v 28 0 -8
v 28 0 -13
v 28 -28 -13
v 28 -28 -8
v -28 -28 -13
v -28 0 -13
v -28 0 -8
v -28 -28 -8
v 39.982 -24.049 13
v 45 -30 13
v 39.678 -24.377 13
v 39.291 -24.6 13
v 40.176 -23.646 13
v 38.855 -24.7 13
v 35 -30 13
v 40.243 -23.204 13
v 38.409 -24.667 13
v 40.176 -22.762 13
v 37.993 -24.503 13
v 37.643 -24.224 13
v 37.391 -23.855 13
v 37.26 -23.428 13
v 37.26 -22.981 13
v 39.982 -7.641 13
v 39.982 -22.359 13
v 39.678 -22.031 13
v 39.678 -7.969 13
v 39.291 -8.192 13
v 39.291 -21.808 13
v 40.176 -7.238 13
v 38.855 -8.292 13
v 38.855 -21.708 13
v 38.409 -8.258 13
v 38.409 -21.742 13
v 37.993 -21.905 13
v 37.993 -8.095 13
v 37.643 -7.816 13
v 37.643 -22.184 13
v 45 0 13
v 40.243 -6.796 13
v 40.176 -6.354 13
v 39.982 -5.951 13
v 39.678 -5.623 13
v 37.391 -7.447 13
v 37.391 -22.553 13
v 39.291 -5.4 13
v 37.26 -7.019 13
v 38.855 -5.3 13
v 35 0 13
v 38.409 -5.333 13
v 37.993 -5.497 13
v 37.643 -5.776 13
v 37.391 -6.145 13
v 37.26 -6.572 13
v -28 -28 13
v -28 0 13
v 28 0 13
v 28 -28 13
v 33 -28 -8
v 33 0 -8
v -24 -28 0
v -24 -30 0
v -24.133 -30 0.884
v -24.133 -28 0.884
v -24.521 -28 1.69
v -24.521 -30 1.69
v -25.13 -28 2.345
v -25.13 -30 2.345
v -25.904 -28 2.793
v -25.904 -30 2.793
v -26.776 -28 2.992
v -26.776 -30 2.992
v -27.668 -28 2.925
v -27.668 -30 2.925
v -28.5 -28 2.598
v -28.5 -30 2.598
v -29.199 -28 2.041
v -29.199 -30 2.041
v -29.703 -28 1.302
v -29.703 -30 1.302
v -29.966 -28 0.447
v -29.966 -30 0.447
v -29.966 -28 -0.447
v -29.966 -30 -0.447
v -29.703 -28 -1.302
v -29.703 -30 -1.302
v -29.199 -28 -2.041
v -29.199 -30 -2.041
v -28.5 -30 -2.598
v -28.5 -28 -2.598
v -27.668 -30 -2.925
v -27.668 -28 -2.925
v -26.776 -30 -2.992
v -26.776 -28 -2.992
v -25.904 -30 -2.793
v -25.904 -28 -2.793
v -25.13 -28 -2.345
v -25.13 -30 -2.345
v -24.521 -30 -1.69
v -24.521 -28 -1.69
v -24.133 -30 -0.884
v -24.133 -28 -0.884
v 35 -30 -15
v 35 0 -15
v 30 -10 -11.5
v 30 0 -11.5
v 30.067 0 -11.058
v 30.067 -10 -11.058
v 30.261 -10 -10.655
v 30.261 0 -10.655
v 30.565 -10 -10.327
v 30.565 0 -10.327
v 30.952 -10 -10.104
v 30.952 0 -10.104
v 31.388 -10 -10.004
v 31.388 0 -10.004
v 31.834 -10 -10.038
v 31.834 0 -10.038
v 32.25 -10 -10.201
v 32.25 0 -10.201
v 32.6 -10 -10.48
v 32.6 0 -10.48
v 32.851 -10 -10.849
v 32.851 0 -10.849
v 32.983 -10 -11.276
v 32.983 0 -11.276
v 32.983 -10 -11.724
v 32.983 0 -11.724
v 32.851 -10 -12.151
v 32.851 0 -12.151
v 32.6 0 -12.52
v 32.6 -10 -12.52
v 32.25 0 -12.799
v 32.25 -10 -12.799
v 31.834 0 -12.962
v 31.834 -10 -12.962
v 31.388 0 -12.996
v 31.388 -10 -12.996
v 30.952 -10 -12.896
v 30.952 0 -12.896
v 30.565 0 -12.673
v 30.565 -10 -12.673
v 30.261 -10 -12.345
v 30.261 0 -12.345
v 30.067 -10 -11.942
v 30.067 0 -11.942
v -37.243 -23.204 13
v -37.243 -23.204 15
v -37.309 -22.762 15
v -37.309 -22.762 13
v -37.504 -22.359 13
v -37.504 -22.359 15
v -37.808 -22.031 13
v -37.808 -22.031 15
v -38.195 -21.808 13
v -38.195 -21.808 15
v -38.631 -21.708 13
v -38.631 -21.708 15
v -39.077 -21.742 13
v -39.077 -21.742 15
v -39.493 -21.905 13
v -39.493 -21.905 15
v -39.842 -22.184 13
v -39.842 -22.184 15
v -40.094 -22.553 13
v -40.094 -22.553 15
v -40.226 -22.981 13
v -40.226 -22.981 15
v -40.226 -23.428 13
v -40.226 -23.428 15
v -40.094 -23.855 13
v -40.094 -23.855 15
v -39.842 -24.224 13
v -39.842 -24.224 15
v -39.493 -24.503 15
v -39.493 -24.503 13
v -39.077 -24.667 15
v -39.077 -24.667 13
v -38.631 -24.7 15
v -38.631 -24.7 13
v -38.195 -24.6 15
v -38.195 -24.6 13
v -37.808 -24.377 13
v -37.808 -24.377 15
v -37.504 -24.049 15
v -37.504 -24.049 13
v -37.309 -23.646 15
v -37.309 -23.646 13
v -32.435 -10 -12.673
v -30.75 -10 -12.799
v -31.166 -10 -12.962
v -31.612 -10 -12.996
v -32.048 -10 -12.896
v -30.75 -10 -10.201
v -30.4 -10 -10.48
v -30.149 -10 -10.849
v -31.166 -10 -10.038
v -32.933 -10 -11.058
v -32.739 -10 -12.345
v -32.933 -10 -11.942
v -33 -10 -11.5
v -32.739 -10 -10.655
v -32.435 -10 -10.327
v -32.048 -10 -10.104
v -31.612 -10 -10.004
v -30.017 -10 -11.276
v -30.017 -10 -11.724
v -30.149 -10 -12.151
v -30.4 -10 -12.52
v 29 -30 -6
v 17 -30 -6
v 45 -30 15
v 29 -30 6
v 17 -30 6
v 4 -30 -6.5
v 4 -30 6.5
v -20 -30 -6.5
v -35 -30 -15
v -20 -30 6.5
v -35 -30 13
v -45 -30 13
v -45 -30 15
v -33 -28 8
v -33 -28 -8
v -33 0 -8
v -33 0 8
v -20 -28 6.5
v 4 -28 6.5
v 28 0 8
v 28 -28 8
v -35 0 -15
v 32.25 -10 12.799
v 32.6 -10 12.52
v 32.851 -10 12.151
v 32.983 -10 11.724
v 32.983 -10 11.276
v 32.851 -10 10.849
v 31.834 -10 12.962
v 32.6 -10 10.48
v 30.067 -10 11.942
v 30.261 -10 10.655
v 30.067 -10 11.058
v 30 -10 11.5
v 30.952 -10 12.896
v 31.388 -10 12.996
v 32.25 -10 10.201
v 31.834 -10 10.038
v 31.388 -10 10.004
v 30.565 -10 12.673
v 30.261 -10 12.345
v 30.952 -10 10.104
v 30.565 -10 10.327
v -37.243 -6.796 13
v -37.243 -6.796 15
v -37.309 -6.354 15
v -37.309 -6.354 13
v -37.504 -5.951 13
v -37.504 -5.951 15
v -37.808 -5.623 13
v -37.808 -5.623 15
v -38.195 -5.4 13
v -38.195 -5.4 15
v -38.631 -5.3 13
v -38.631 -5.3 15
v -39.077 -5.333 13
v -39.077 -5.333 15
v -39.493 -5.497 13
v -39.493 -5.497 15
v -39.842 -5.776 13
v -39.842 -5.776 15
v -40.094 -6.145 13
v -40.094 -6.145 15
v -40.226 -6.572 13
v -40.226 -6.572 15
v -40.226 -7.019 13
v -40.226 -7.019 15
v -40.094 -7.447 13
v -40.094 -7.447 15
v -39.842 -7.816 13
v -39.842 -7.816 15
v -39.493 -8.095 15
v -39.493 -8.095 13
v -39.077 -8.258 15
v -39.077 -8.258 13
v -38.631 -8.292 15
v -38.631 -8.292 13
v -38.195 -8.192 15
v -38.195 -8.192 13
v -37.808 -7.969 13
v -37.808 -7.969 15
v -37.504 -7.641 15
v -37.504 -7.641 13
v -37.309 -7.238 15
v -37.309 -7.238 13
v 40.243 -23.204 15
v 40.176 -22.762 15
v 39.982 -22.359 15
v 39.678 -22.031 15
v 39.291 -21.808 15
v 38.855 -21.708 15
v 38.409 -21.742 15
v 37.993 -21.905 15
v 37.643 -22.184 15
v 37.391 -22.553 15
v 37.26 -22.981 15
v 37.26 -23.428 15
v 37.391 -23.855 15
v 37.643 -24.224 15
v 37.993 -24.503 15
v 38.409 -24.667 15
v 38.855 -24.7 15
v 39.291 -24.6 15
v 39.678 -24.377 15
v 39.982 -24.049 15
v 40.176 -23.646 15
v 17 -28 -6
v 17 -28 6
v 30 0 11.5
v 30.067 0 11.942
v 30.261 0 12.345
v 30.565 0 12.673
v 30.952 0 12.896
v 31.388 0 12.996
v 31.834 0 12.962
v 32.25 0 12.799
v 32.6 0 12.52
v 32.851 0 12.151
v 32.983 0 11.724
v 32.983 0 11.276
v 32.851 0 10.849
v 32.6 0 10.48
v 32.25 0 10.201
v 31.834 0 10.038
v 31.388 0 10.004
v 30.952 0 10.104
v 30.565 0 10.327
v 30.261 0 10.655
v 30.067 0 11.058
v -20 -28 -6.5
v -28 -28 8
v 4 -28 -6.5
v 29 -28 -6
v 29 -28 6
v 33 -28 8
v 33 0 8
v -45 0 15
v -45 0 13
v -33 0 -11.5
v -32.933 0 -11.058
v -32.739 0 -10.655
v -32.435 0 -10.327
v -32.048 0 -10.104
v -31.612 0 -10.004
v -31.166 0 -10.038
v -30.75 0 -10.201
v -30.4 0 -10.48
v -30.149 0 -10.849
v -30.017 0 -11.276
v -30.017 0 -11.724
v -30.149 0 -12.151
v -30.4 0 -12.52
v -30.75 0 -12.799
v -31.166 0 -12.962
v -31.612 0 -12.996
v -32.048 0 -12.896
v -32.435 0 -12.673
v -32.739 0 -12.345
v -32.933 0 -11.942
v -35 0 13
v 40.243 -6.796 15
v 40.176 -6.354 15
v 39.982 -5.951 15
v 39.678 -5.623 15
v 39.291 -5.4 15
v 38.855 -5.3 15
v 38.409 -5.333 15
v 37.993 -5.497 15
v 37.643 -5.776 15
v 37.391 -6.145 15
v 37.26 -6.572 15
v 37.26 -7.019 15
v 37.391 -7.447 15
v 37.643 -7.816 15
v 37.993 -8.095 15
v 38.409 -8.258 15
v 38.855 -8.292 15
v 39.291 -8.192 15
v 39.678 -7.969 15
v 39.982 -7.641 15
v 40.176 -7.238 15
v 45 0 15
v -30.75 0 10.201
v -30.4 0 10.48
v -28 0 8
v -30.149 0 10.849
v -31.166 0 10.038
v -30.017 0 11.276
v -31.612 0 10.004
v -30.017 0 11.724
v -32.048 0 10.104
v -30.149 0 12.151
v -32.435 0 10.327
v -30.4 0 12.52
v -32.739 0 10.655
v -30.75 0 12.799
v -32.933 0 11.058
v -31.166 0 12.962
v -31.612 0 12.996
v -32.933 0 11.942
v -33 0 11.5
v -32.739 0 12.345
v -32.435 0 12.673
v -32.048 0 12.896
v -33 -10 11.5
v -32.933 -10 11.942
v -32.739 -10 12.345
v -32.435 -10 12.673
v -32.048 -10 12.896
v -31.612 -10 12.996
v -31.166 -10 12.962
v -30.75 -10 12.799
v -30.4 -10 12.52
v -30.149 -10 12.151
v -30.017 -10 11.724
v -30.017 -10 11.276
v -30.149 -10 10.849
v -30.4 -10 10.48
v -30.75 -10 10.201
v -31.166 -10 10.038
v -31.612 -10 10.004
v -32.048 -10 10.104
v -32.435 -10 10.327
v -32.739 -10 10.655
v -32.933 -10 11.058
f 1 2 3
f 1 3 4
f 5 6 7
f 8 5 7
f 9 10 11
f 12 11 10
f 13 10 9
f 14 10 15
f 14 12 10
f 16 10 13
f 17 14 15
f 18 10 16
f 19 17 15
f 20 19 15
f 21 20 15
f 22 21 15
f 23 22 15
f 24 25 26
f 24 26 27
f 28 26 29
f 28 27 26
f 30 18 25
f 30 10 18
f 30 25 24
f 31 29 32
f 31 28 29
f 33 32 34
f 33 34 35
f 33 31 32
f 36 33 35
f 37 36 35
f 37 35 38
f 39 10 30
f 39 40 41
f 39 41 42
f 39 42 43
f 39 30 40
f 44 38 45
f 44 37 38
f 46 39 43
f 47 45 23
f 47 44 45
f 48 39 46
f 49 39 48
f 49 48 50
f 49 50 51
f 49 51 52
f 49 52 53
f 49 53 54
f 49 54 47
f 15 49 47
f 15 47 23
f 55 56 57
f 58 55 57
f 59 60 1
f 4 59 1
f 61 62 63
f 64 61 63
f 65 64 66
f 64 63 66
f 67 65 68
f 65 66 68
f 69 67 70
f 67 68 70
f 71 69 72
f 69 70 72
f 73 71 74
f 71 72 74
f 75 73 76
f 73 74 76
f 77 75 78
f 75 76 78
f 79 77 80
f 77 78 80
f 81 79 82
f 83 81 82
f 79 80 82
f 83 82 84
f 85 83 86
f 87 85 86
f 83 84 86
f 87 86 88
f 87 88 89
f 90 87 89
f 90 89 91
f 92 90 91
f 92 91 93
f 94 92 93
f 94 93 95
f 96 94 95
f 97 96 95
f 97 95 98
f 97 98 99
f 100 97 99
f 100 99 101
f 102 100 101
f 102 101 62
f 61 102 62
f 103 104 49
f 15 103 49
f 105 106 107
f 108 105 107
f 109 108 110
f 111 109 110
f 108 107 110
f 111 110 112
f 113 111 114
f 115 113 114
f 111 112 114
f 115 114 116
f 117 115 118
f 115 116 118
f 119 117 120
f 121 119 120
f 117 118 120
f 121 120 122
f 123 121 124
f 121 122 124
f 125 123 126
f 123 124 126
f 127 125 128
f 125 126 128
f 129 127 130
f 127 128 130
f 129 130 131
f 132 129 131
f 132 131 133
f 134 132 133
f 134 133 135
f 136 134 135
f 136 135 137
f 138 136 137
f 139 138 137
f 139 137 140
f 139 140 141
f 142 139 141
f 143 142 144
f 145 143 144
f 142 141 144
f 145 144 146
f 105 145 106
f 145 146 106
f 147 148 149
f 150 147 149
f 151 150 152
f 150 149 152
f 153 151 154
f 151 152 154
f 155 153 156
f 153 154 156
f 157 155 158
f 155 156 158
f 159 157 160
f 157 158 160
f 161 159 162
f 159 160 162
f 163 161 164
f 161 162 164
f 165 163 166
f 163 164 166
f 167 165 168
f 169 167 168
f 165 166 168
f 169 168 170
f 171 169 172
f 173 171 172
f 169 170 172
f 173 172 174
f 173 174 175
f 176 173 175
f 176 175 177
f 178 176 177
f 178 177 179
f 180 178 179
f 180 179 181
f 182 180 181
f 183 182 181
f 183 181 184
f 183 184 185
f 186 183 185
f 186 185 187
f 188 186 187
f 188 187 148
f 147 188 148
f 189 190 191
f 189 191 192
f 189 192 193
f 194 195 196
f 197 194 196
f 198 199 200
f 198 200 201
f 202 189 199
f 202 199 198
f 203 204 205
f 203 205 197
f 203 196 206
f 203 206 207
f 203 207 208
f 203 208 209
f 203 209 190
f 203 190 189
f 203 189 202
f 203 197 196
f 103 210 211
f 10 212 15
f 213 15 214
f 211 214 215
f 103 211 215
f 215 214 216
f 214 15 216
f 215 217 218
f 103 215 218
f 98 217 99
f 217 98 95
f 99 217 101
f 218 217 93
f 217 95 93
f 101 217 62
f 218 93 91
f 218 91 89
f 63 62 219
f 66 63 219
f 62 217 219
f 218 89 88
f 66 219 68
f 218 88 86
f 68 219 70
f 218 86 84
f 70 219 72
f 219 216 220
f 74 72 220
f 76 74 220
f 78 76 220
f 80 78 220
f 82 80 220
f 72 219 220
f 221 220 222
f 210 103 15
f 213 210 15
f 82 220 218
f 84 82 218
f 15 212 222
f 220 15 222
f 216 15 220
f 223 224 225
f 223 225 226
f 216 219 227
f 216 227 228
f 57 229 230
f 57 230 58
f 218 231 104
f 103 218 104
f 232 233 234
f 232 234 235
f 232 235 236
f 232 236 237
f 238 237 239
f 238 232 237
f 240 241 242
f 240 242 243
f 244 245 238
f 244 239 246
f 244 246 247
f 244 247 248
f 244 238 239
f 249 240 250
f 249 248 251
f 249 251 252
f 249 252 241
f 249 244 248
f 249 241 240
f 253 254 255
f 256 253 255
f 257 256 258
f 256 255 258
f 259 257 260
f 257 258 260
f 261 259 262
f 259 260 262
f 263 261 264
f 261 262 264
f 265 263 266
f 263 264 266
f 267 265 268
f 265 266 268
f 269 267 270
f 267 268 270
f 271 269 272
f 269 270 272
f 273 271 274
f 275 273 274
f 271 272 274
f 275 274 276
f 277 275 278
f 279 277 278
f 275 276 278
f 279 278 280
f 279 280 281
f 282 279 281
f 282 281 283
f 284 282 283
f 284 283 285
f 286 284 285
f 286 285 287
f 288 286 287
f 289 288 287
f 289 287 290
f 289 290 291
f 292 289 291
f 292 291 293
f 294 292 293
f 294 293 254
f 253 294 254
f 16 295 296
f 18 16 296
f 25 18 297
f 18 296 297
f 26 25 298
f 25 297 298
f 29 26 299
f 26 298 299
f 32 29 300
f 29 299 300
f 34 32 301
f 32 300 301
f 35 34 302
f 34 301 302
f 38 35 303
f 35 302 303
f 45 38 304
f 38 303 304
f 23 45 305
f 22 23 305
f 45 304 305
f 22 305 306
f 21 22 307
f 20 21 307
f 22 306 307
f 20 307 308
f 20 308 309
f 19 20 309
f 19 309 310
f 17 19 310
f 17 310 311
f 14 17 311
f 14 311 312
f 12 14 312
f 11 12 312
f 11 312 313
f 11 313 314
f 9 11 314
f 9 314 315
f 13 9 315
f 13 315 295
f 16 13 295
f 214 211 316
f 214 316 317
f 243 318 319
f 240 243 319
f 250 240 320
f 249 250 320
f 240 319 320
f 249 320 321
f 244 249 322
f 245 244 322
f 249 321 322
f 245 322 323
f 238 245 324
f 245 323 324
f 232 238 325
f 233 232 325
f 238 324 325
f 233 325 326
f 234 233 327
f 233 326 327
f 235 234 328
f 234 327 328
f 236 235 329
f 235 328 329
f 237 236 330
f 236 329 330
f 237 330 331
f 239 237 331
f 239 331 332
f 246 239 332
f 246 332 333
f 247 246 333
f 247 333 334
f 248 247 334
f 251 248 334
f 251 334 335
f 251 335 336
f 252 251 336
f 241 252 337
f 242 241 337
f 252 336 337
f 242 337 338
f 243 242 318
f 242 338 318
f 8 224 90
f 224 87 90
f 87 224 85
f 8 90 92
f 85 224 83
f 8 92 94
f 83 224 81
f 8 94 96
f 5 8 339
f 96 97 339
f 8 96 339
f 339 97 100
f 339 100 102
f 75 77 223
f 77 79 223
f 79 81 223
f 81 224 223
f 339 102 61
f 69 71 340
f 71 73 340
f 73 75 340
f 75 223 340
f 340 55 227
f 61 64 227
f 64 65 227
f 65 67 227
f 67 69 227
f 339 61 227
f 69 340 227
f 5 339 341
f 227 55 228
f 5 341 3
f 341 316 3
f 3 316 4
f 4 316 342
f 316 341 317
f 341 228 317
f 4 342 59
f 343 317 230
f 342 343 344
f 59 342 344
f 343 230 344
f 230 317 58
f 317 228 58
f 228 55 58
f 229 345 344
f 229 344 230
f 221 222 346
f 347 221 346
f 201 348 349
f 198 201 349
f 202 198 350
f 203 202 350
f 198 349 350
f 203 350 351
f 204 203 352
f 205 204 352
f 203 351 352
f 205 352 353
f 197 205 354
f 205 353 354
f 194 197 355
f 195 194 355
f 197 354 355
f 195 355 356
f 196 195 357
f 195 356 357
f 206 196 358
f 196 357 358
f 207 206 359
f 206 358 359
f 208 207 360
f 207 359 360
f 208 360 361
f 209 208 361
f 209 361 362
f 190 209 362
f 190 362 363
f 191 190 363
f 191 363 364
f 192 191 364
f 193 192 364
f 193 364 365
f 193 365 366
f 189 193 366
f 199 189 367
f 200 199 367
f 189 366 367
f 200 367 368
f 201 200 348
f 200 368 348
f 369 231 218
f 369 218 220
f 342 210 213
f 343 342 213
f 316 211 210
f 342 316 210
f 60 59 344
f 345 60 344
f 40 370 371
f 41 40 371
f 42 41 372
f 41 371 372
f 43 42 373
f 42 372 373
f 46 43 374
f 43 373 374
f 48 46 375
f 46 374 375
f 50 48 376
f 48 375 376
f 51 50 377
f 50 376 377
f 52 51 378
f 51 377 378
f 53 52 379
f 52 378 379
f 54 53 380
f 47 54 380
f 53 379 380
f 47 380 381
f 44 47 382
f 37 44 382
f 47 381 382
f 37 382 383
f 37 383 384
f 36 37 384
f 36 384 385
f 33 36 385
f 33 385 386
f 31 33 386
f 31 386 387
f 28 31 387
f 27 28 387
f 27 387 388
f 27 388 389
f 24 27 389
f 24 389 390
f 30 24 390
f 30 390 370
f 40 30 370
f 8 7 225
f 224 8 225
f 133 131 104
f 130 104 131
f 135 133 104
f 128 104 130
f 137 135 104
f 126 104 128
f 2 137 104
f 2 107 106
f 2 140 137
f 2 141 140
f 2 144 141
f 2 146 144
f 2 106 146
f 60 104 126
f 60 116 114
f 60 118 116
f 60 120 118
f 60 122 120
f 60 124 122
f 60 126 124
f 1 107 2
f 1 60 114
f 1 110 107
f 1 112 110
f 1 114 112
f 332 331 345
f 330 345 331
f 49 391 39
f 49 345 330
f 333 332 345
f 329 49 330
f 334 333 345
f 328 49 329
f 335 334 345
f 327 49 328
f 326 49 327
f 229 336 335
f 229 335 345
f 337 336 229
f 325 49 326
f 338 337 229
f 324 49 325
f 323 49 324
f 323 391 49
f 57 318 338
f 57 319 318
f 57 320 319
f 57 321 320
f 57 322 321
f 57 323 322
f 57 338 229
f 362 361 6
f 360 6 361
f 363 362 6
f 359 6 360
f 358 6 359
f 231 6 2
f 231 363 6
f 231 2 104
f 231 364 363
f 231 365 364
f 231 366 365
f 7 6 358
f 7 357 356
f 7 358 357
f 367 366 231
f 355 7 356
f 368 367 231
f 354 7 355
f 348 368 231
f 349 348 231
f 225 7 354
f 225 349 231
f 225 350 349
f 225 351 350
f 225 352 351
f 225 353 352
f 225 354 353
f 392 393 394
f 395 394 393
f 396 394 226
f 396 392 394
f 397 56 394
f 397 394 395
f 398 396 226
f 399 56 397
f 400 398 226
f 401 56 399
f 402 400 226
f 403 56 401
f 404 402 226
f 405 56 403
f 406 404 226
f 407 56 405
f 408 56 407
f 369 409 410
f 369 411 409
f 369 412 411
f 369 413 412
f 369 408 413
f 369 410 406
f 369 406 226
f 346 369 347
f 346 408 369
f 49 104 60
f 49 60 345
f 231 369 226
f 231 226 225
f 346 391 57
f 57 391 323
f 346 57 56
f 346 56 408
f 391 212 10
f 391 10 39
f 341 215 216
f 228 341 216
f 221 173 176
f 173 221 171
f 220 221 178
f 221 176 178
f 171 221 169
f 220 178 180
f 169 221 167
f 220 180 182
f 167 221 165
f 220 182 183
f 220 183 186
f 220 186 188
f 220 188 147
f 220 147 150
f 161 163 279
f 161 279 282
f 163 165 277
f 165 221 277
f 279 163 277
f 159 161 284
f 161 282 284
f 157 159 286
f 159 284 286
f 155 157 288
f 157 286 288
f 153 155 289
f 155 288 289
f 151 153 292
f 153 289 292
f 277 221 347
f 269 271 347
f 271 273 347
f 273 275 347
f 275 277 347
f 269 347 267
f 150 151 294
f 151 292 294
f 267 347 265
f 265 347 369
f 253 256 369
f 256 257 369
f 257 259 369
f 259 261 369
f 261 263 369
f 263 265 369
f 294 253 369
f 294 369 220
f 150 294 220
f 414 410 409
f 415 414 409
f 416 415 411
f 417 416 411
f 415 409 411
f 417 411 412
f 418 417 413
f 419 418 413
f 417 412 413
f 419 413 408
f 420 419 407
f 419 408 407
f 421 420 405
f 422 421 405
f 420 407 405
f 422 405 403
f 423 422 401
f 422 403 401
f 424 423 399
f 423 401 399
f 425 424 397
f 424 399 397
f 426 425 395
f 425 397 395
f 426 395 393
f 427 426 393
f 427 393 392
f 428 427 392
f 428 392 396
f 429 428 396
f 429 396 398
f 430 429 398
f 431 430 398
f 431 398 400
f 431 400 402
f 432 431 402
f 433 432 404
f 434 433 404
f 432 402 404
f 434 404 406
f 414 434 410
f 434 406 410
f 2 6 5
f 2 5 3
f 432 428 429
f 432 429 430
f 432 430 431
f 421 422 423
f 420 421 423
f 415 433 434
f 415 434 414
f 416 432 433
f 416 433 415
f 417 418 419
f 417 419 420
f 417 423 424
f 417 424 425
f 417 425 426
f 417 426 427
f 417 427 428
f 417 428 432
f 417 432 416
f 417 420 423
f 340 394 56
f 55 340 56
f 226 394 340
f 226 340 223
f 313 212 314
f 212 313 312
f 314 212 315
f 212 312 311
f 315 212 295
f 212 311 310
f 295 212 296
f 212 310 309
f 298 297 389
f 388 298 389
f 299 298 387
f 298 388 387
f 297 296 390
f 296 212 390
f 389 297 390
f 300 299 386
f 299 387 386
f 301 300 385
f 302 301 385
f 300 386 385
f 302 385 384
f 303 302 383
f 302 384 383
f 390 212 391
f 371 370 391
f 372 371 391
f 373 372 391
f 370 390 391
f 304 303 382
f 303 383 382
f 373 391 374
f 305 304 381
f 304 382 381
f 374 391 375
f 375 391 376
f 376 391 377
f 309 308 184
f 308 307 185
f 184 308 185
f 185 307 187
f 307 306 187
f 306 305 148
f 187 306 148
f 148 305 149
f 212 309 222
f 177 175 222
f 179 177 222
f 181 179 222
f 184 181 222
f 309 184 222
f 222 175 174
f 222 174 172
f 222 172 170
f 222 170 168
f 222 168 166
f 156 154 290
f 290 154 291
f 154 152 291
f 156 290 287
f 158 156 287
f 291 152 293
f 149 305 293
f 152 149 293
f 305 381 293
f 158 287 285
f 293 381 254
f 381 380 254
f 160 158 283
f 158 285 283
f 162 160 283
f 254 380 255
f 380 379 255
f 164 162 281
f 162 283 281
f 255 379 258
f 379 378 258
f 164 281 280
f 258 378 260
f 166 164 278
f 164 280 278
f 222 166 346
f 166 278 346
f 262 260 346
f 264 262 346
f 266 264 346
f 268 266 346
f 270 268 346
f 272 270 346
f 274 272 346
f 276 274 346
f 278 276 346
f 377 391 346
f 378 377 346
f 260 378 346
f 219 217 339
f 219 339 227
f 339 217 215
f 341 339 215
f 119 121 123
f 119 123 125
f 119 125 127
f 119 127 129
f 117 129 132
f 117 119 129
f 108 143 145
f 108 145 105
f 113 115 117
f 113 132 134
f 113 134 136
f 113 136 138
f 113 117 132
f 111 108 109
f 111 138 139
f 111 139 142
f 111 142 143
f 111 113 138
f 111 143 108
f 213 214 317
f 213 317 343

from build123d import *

# Parameters (mm, degrees)
F0_W      = 70
F0_H      = 30
F1_DEPTH  = 30
F2_T      = -2
F3_R      = 3
F3_W      = 12
F3_H      = 12
F3_W_2    = 24
F3_H_2    = 13
F4_DEPTH  = 30.001
F5_W      = 5
F5_H      = 5
F6_DEPTH  = 28
F7_R      = 1.5
F8_DEPTH  = 10
F9_W      = 10
F9_H      = 30
F10_DEPTH = 2
F12_R     = 1.5
F13_DEPTH = 30.001


with BuildPart() as f1:
    # F0 (on Front) → F1 (new body)
    with BuildSketch(Plane.XZ):
        Rectangle(F0_W, F0_H)
    extrude(amount=F1_DEPTH)

    # F2
    f2_openings = [f1.faces().sort_by_distance(p)[0] for p in [
        (0, 0, 0),
    ]]
    offset(amount=F2_T, openings=f2_openings)

    # F3 (on face) → F4 (cut, through all)
    with BuildSketch(Plane.XZ.offset(30)):
        with Locations((-27, 0)):
            Circle(F3_R)
        with Locations((23, 0)):
            Rectangle(F3_W, F3_H)
        with Locations((-8, 0)):
            Rectangle(F3_W_2, F3_H_2)
    extrude(amount=-F4_DEPTH, mode=Mode.SUBTRACT)

    # F5 (on face) → F6 (join, through all)
    with BuildSketch(Plane(origin=(0, 0, 0), x_dir=(-1, 0, 0), z_dir=(0, 1, 0))):
        with Locations((-30.5, 10.5)):
            Rectangle(F5_W, F5_H)
        with Locations((30.5, 10.5)):
            Rectangle(F5_W, F5_H)
        with Locations((30.5, -10.5)):
            Rectangle(F5_W, F5_H)
        with Locations((-30.5, -10.5)):
            Rectangle(F5_W, F5_H)
    extrude(amount=-F6_DEPTH)

    # F7 (on face) → F8 (cut)
    with BuildSketch(Plane(origin=(0, 0, 0), x_dir=(-1, 0, 0), z_dir=(0, 1, 0))):
        with Locations((-31.5, 11.5)):
            Circle(F7_R)
        with Locations((31.5, 11.5)):
            Circle(F7_R)
        with Locations((-31.5, -11.5)):
            Circle(F7_R)
        with Locations((31.5, -11.5)):
            Circle(F7_R)
    extrude(amount=-F8_DEPTH, mode=Mode.SUBTRACT)



with BuildPart() as f10:
    # F9 (on face) → F10 (new body)
    with BuildSketch(Plane.XY.offset(15)):
        with Locations((-40, -15)):
            Rectangle(F9_W, F9_H)
    extrude(amount=-F10_DEPTH)


with BuildPart() as f1_1:
    add(f1.part)

    add(f10.part)  # F11 merges F10
    # F11: F10 across plane
    add(f10.part.mirror(Plane.YZ))

    # F12 (on face) → F13 (cut, through all)
    with BuildSketch(Plane.XY.offset(15)):
        with Locations((-38.7428589165, -6.7958449945)):
            Circle(F12_R)
        with Locations((38.7428589165, -6.7958449945)):
            Circle(F12_R)
        with Locations((-38.7428589165, -23.2041550055)):
            Circle(F12_R)
        with Locations((38.7428589165, -23.2041550055)):
            Circle(F12_R)
    extrude(amount=-F13_DEPTH, mode=Mode.SUBTRACT)


solid = f1_1.part
